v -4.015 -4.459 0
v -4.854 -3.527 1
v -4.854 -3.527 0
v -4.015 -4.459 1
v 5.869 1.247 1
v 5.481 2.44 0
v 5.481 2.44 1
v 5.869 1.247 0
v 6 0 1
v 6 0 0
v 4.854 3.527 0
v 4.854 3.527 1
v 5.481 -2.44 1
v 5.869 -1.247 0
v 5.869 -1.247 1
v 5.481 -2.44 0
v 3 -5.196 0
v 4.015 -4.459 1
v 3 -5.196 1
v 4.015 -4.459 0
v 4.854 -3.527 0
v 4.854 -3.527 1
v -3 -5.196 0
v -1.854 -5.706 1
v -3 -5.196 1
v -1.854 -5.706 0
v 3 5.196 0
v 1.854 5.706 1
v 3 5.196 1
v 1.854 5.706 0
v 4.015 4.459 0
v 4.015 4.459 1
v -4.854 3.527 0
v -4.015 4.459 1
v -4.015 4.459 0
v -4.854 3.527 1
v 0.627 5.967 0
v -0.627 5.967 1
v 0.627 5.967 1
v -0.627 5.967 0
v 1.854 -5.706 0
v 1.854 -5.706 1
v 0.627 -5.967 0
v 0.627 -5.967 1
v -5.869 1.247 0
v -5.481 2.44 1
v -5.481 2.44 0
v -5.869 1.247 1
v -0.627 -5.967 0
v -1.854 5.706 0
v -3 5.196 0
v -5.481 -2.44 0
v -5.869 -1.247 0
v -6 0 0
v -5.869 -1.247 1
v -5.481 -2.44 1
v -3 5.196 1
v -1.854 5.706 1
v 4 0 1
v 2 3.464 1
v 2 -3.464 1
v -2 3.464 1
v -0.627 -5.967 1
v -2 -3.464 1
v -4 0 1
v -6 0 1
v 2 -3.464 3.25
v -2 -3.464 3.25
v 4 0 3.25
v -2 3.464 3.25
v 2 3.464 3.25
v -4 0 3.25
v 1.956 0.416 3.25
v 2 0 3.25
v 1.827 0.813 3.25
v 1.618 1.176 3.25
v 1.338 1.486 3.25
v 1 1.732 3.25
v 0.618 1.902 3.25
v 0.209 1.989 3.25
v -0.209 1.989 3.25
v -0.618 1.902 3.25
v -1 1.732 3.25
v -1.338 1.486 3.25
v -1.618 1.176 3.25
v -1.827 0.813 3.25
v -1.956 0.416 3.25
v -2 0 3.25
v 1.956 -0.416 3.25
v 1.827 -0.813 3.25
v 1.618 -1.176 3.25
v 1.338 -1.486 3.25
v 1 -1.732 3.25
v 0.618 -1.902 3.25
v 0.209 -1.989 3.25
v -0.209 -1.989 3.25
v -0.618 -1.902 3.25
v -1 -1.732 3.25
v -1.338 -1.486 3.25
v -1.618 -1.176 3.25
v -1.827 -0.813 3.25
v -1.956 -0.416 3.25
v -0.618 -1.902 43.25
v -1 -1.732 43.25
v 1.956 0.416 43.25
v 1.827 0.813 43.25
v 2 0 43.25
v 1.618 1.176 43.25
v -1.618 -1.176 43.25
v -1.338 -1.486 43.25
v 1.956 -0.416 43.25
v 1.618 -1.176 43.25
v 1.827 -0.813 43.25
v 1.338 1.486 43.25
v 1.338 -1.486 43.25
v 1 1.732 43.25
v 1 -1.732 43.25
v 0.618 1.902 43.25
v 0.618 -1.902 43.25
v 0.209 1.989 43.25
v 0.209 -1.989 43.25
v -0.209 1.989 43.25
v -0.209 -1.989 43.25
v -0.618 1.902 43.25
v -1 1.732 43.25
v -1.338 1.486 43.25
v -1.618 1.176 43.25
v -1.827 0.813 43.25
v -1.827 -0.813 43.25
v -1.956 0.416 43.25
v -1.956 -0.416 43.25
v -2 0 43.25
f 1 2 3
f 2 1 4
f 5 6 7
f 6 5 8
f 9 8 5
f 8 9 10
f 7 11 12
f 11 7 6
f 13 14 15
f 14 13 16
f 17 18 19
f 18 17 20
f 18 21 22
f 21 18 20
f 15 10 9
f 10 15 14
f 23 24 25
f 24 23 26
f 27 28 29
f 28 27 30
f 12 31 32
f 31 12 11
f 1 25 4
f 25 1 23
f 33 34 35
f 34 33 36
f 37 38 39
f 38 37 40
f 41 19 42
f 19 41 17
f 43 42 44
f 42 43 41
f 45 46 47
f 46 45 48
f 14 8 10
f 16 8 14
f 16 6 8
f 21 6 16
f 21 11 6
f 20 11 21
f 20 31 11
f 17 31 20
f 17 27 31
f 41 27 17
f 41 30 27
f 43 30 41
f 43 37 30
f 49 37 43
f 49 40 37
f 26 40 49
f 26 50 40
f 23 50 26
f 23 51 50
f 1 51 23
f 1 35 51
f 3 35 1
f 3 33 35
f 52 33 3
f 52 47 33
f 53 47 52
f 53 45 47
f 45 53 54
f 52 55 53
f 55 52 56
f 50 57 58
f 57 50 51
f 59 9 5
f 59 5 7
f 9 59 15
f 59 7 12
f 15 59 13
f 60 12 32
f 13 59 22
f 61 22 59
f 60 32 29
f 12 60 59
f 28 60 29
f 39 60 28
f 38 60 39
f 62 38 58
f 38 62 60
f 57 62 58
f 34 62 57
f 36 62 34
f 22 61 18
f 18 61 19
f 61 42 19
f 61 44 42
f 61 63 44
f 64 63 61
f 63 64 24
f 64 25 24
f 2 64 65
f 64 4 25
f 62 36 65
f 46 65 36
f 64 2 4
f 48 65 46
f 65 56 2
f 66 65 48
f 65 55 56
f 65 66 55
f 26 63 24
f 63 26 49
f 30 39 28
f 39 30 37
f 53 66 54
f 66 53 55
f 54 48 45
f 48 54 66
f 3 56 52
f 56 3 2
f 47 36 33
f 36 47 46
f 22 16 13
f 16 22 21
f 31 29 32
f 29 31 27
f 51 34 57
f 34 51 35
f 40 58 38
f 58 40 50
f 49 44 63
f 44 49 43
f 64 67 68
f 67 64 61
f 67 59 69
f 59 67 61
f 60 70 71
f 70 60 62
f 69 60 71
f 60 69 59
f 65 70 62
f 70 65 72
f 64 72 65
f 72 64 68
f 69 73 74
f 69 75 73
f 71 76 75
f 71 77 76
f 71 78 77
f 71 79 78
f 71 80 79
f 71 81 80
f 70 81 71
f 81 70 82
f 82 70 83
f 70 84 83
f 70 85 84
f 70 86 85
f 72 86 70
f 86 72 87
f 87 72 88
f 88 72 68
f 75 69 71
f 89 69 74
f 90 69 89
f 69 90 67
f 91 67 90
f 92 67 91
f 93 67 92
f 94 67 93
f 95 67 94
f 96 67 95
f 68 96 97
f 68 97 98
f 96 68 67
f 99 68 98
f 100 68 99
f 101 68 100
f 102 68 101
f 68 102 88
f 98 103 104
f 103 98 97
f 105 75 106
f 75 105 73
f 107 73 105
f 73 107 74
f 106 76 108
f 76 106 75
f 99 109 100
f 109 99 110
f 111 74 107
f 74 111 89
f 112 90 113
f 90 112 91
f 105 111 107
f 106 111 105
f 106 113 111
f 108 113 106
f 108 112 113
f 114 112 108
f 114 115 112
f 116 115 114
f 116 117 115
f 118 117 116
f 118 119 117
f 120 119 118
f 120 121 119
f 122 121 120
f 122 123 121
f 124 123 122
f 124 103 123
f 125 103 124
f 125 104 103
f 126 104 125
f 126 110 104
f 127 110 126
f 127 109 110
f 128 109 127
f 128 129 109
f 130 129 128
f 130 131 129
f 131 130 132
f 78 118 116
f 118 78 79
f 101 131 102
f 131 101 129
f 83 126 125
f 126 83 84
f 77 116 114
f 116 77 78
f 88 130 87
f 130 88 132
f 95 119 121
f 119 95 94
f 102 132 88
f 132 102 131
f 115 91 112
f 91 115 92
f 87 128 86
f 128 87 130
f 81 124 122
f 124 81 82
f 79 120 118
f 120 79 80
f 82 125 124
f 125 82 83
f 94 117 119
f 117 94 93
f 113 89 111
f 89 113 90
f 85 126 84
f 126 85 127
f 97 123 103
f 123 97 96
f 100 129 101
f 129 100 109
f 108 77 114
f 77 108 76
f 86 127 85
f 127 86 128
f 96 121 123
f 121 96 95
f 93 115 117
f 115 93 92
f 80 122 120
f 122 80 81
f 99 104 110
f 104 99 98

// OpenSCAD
// file: config.scad
// Author: Mihai Oltean, www.tcreate.org, mihai.oltean@gmail.com
// More details: jenny5.org
// Source: github.com/jenny5-robot
// MIT License
//--------------------------------------------------------------

aluminium_color = "Silver";
screw_color = "LightSlateGray";
frame_color = aluminium_color;
shaft_color = "Silver";
plastic_color = "LimeGreen";
pulley_color = "DarkSlateGray";
// file: params_basic_components.scad
// Author: Mihai Oltean, www.tcreate.org, mihai.oltean@gmail.com
// More details: jenny5.org
// Source: github.com/jenny5-robot
// MIT License
//--------------------------------------------------------------

spring_length = 20;

smooth_rod_8_radius = 4;
smooth_rod_10_radius = 5;
smooth_rod_12_radius = 6;

tolerance = 0.1;
display_tolerance = 1;

overlap_tolerance = 0.01;


wall_thick_1 = 1;
wall_thick_2 = 2;
wall_thick_3 = 3;
wall_thick_4 = 4;
wall_thick_5 = 5;
wall_thick_5_5 = 5.5;
wall_thick_6 = 6;
wall_thick_7 = 7;
wall_thick_8 = 8;
wall_thick_9 = 9;
wall_thick_10 = 10;
wall_thick_12 = 10;

wrench_radius = 11;

ghidaj_radius = 4;
ghidaj_radius_12 = 6;

canal_diameter = 8.22;
canal_height = 2.2;

filament_radius = 0.9;

bowden_tube_radius = 2.5;

m3_tolerance = 0.1;

latura_mare_L = 40;
latura_mica_L = 15;
grosime_perete_L = 3;

latura_L_50x50 = 50;
latura_L_40x40 = 40;

latura_U_50x50 = 50;
latura_U_40x40 = 40;


tolerance_z = [0, 0, tolerance];
tolerance_x = [tolerance, 0, 0];
tolerance_y = [0, tolerance, 0];

display_tolerance_z = [0, 0, display_tolerance];
display_tolerance_x = [display_tolerance, 0, 0];
display_tolerance_y = [0, display_tolerance, 0];

display_tolerance_xz = [display_tolerance, 0, display_tolerance];
display_tolerance_xy = [display_tolerance, display_tolerance, 0];
display_tolerance_yz = [0, display_tolerance, display_tolerance];

display_tolerance_xyz = [display_tolerance, display_tolerance, display_tolerance];
// file: params_screws_nuts_washers.scad
m2_screw_radius = 1;
m2_nut_radius = 2.2;
m2_nut_height = 1.6;
m2_nut_thick = m2_nut_height;

m3_screw_radius = 1.5;
m3_nut_radius = 3.1;
m3_nut_height = 2.3;
m3_nut_thick = m3_nut_height;
m3_autolock_nut_thick = 4.2;

m4_screw_radius = 2;
m4_nut_radius = 4;
m4_auto_lock_nut_height = 5;
m4_nut_height = 3.25;
m4_nut_thick = 3.25;

m5_screw_radius = 2.5;
m5_nut_radius = 4.6;
m5_nut_height = 4;

m6_screw_radius = 3;
m6_nut_radius = 5.65;
m6_nut_thick = 5;
m6_nut_slim_thick = 3;
m6_autolock_nut_thick = 6;
m6_long_nut_thick = 9;

m8_screw_head_height = 5.7;
m8_screw_radius = 3.9;
m8_nut_small_width = 12.8;
m8_nut_radius = 7.3;
m8_slim_nut_small_width = 12.4;
m8_nut_thick = 6.5;
m8_nut_height = m8_nut_thick;
m8_slim_nut_height = 5.5;
m8_screw_head_radius = 6.5;
m8_autolock_nut_thick = 8;

m10_screw_radius = 5;
m10_nut_thick = 8;
m10_nut_radius = 9.8;

M12_screw_radius = 6;
M12_nut_thick = 8;
M12_nut_radius = 11;
M12_long_nut_thick = 36;
M12_autolock_nut_thick = 14;

m10_long_nut_radius = 9.71;
m10_long_nut_height = 29.8;

m10_long_thick_nut_radius = 7.41;
m10_long_thick_nut_height = 30.4;

m12_plastic_nut_radius = 10.45;
m12_plastic_nut_height = 23.3;

tr12_3_nut_radius = 11;
tr12_3_nut_height = 18.1;

washer_5 = 0.97;

washer_4_12_radius = 6;
washer_4_12_external_radius = 6;
washer_4_12_thick = 1;
washer_4_thick = 1;
washer_4_12_internal_radius = 2.15;

washer_4_9_external_radius = 4.5;
washer_4_9_internal_radius = 2.15;
washer_4_9_thick = 1;

washer_6_thick = 1.5;
washer_8_thick = 1.5;
washer_5_thick = 1;

washer_10_height = 2;
washer_10_thick = 2;

washer_12_thick = 2;

washer_5_15_external_radius = 7.5;
washer_5_15_thick = 1;
washer_5_thick = 1;
washer_5_15_internal_radius = 2.65;
// main file
// Author: Mihai Oltean, www.tcreate.org, mihai.oltean@gmail.com
// More details: jenny5.org
// Source: github.com/jenny5-robot
// MIT License
//--------------------------------------------------------------

include <params_screws_nuts_washers.scad>
include <params_basic_components.scad>
include <config.scad>

/////////////////////////////////////////////////////////////////////////////////////////////////////////////////////////
module nut (internal_radius, external_radius, height)
{
	color (screw_color)
	difference() {
		cylinder ( h = height, r = external_radius, $fn = 6);
		translate ([0, 0, -tolerance]) cylinder ( h = height + 2 * tolerance, r = internal_radius, $fn = 30);
	}
}
/////////////////////////////////////////////////////////////////////////////////////////////////////////////////////////
module nut_fluture (internal_radius, external_radius, height)
{
	color (screw_color){
		difference() {
			cylinder ( h = height, r1 = external_radius + 1, r2 = external_radius, $fn = 30);
			translate ([0, 0, -tolerance]) cylinder ( h = height + 2 * tolerance, r = internal_radius, $fn = 30);
		}
		// aripioare
		translate ([external_radius + 1, -1, 0]) rotate ([0, -40, 0]) cube([10, 2, 4]);
		rotate ([0, 0, 180]) translate ([external_radius + 1, -1, 0]) rotate ([0, -40, 0]) cube([10, 2, 4]);
	}
	
}
/////////////////////////////////////////////////////////////////////////////////////////////////////////////////////////
module autolock_nut (internal_radius, external_radius, height)
{
	color (screw_color)
	difference() {
		union(){
			cylinder ( h = height - 1, r = external_radius, $fn = 6);
			translate ([0, 0, height - 1]) cylinder ( h = 1, r = internal_radius + 1, $fn = 30);
		}
		translate ([0, 0, -tolerance]) cylinder ( h = height + 2 * tolerance, r = internal_radius, $fn = 30);
	}
}
/////////////////////////////////////////////////////////////////////////////////////////////////////////////////////////
module hexa_screw (screw_radius, screw_length, head_radius, head_thick)
{
	color (screw_color)
	union(){
		cylinder (h = head_thick, r = head_radius, $fn = 6);
		translate ([0, 0, head_thick]) cylinder (h = screw_length, r = screw_radius, $fn = 30);
	}
}
/////////////////////////////////////////////////////////////////////////////////////////////////////////////////////////
module inbus_screw (screw_radius, screw_length, head_radius, head_thick)
{
	color (screw_color)
	difference(){
		union(){
			cylinder (h = head_thick, r = head_radius, $fn = 30);
			translate ([0, 0, head_thick]) cylinder (h = screw_length, r = screw_radius, $fn = 30);
		}
		translate ( - tolerance_z) cylinder (h = head_thick, r = 4, $fn = 6);
	}
}
/////////////////////////////////////////////////////////////////////////////////////////////////////////////////////////
module screw (screw_radius, screw_length, head_radius, head_thick)
{
	color (screw_color)
	difference(){
		union(){
			cylinder (h = head_thick, r = head_radius, $fn = 30);
			translate ([0, 0, head_thick]) cylinder (h = screw_length, r = screw_radius, $fn = 30);
		}
		translate ([-head_radius, -0.75, 0] - display_tolerance_z) cube([2 * head_radius, 1.5, head_thick - 0.5 + display_tolerance]);
	}
}
/////////////////////////////////////////////////////////////////////////////////////////////////////////////////////////
module sunken_screw (screw_radius, screw_length, head_radius, head_thick)
{
	color (screw_color)
	difference(){
		union(){
			cylinder (h = head_thick, r1 = head_radius, r2 = screw_radius, $fn = 30);
			cylinder (h = screw_length, r = screw_radius, $fn = 30);
		}
		translate ([-head_radius, -0.75, 0] - display_tolerance_z) cube([2 * head_radius, 1.5, head_thick - 0.5 + display_tolerance]);
	}
}
/////////////////////////////////////////////////////////////////////////////////////////////////////////////////////////
module grub_screw (screw_radius, screw_length)
{
	color (screw_color)
	difference(){
		union(){
			cylinder (h = screw_length, r = screw_radius, $fn = 30);
		}
		translate ([-screw_radius, -0.75, 0] - display_tolerance_z) cube([2 * screw_radius, 1.5, 1 + display_tolerance]);
	}
}
/////////////////////////////////////////////////////////////////////////////////////////////////////////////////////////
module washer (internal_radius, external_radius, thick)
{
	color (screw_color)
	difference() {
		cylinder ( h = thick, r = external_radius, $fn = 30);
		translate (-tolerance_z) cylinder ( h = thick + 2 * tolerance, r = internal_radius, $fn = 30);
	}
}
/////////////////////////////////////////////////////////////////////////////////////////////////////////////////////////////////////
module M3x10_sunken()
{
	sunken_screw(m3_screw_radius, 10, m3_nut_radius, m3_nut_thick);
}
/////////////////////////////////////////////////////////////////////////////////////////////////////////////////////////////////////
module M3x15()
{
	screw(m3_screw_radius, 15, m3_nut_radius, m3_nut_thick);
}
/////////////////////////////////////////////////////////////////////////////////////////////////////////////////////////////////////
module M4x40_screw()
{
	screw(m4_screw_radius, 40, m4_nut_radius, m4_nut_thick);
}
///////////////////////////////////////////////////////////////////////////////////////
module M4x20_sunken()
{
	sunken_screw(m4_screw_radius, 20, m4_nut_radius, m4_nut_thick);
}
/////////////////////////////////////////////////////////////////////////////////////////////////////////////////////////////////////
module M4x30_sunken()
{
	sunken_screw(m4_screw_radius, 30, m4_nut_radius, m4_nut_thick);
}
/////////////////////////////////////////////////////////////////////////////////////////////////////////////////////////////////////
module M4x35_sunken()
{
	sunken_screw(m4_screw_radius, 35, m4_nut_radius, m4_nut_thick);
}
/////////////////////////////////////////////////////////////////////////////////////////////////////////////////////////////////////
module M4x40_sunken()
{
	sunken_screw(m4_screw_radius, 40, m4_nut_radius, m4_nut_thick);
}
/////////////////////////////////////////////////////////////////////////////////////////////////////////////////////////////////////
module M4x50_sunken()
{
	sunken_screw(m4_screw_radius, 50, m4_nut_radius, m4_nut_thick);
}
/////////////////////////////////////////////////////////////////////////////////////////////////////////////////////////////////////
module M4x12_hexa()
{
	hexa_screw(m4_screw_radius, 12, m4_nut_radius, m4_nut_thick);
}
/////////////////////////////////////////////////////////////////////////////////////////////////////////////////////////////////////
module M4x16_hexa()
{
	hexa_screw(m4_screw_radius, 16, m4_nut_radius, m4_nut_thick);
}
/////////////////////////////////////////////////////////////////////////////////////////////////////////////////////////////////////
module M4x20_hexa()
{
	hexa_screw(m4_screw_radius, 20, m4_nut_radius, m4_nut_thick);
}
/////////////////////////////////////////////////////////////////////////////////////////////////////////////////////////////////////
module M4x25_hexa()
{
	hexa_screw(m4_screw_radius, 25, m4_nut_radius, m4_nut_thick);
}
/////////////////////////////////////////////////////////////////////////////////////////////////////////////////////////////////////
module M4x30_hexa()
{
	hexa_screw(m4_screw_radius, 30, m4_nut_radius, m4_nut_thick);
}
////////////////////////////////////////////////////////////////////////////////////////////////////////////////////////////
module M4x40_hexa()
{
	hexa_screw(m4_screw_radius, 40, m4_nut_radius, m4_nut_thick);
}
/////////////////////////////////////////////////////////////////////////////////////////////////////////////////////////////
module M4x45_hexa()
{
	hexa_screw(m4_screw_radius, 45, m4_nut_radius, m4_nut_thick);
}
////////////////////////////////////////////////////////////////////////////////////////////////////////////////////////////
module M8x40_inbus()
{
	inbus_screw(m8_screw_radius, 40, m8_nut_radius, m8_nut_thick);
}
///////////////////////////////////////////////////////////////////////////////////////////////////////////////////////////
module M8_hexa(length)
{
	hexa_screw(m8_screw_radius, length, m8_nut_radius, m8_nut_thick);
}
////////////////////////////////////////////////////////////////////////////////////////////////////////////////////////////
module M8x20_hexa()
{
	hexa_screw(m8_screw_radius, 20, m8_nut_radius, m8_nut_thick);
}
////////////////////////////////////////////////////////////////////////////////////////////////////////////////////////////
module M8x50_hexa()
{
	hexa_screw(m8_screw_radius, 50, m8_nut_radius, m8_nut_thick);
}
////////////////////////////////////////////////////////////////////////////////////////////////////////////////////////////
module M8x60_hexa()
{
	hexa_screw(m8_screw_radius, 60, m8_nut_radius, m8_nut_thick);
}
////////////////////////////////////////////////////////////////////////////////////////////////////////////////////////////
module M8x70_hexa()
{
	hexa_screw(m8_screw_radius, 70, m8_nut_radius, m8_nut_thick);
}
////////////////////////////////////////////////////////////////////////////////////////////////////////////////////////////
module M8x80_hexa()
{
	hexa_screw(m8_screw_radius, 80, m8_nut_radius, m8_nut_thick);
}
////////////////////////////////////////////////////////////////////////////////////////////////////////////////////////////
module M12_hexa(length)
{
	hexa_screw(M12_screw_radius, length, M12_nut_radius, M12_nut_thick);
}
////////////////////////////////////////////////////////////////////////////////////////////////////////////////////////////
module M3_nut()
{
	nut(m3_screw_radius, m3_nut_radius, m3_nut_thick);
}
///////////////////////////////////////////////////////////////////////////////////////////////////////////////////////////
module M12_nut()
{
	nut(M12_screw_radius, M12_nut_radius, M12_nut_thick);
}
///////////////////////////////////////////////////////////////////////////////////////////////////////////////////////////
module M12_long_nut()
{
	nut(M12_screw_radius, M12_nut_radius, M12_long_nut_thick);
}
///////////////////////////////////////////////////////////////////////////////////////////////////////////////////////////
module M3_autolock_nut()
{
	autolock_nut(m3_screw_radius, m3_nut_radius, m3_auto_lock_nut_height);
}
////////////////////////////////////////////////////////////////////////////////////////////////////////////////////////////
module M12_autolock_nut()
{
	autolock_nut(M12_screw_radius, M12_nut_radius, M12_autolock_nut_thick);
}
////////////////////////////////////////////////////////////////////////////////////////////////////////////////////////////
module M3x5_grub()
{
	grub_screw(m3_screw_radius, 5);
}
////////////////////////////////////////////////////////////////////////////////////////////////////////////////////////////
module M4_nut()
{
	nut(m4_screw_radius, m4_nut_radius, m4_nut_thick);
}
/////////////////////////////////////////////////////////////////////////////////////////////////////////////////////////////
module M6_nut()
{
	nut(m6_screw_radius, m6_nut_radius, m6_nut_thick);
}
////////////////////////////////////////////////////////////////////////////////////////////////////////////////////////////
module M8_nut()
{
	nut(m8_screw_radius, m8_nut_radius, m8_nut_thick);
}
//////////////////////////////////////////////////////////////////////////////////////////////////////////////////////////
module M8_slim_nut()
{
	nut(m8_screw_radius, m8_nut_radius, m8_slim_nut_height);
}
//////////////////////////////////////////////////////////////////////////////////////////////////////////////////////////
module M10_nut()
{
	nut(m10_screw_radius, m10_nut_radius, m10_nut_thick);
}
//////////////////////////////////////////////////////////////////////////////////////////////////////////////////////////
module M4_autolock_nut()
{
	autolock_nut(m4_screw_radius, m4_nut_radius, m4_auto_lock_nut_height);
}
///////////////////////////////////////////////////////////////////////////////////////////////////////////////////////////
module M4x12_washer()
{
	washer(2.15, 6, washer_4_thick);
}
//////////////////////////////////////////////////////////////////////////////////////////////////////////////////////////
module M4x9_washer()
{
	washer(2.15, 4.5, washer_4_thick);
}
///////////////////////////////////////////////////////////////////////////////////////////////////////////////////////////
module washer_4_9()
{
	washer(2.15, 4.5, washer_4_thick);
}
//////////////////////////////////////////////////////////////////////////////////////////////////////////////////////////
module washer_4_12()
{
	washer(2.15, 6, washer_4_thick);
}
//////////////////////////////////////////////////////////////////////////////////////////////////////////////////////////
module washer_9_16()
{
	washer(4.5, 8, washer_8_thick);
}
//////////////////////////////////////////////////////////////////////////////////////////////////////////////////////////////
module washer_4_15()
{
	washer(2.15, 7.5, washer_4_thick);
}
//////////////////////////////////////////////////////////////////////////////////////////////////////////////////////////
module M12_washer()
{
	washer(6, 12, washer_12_thick);
}
//////////////////////////////////////////////////////////////////////////////////////////////////////////////////////////////

washer_4_12();
M4x40_hexa();
